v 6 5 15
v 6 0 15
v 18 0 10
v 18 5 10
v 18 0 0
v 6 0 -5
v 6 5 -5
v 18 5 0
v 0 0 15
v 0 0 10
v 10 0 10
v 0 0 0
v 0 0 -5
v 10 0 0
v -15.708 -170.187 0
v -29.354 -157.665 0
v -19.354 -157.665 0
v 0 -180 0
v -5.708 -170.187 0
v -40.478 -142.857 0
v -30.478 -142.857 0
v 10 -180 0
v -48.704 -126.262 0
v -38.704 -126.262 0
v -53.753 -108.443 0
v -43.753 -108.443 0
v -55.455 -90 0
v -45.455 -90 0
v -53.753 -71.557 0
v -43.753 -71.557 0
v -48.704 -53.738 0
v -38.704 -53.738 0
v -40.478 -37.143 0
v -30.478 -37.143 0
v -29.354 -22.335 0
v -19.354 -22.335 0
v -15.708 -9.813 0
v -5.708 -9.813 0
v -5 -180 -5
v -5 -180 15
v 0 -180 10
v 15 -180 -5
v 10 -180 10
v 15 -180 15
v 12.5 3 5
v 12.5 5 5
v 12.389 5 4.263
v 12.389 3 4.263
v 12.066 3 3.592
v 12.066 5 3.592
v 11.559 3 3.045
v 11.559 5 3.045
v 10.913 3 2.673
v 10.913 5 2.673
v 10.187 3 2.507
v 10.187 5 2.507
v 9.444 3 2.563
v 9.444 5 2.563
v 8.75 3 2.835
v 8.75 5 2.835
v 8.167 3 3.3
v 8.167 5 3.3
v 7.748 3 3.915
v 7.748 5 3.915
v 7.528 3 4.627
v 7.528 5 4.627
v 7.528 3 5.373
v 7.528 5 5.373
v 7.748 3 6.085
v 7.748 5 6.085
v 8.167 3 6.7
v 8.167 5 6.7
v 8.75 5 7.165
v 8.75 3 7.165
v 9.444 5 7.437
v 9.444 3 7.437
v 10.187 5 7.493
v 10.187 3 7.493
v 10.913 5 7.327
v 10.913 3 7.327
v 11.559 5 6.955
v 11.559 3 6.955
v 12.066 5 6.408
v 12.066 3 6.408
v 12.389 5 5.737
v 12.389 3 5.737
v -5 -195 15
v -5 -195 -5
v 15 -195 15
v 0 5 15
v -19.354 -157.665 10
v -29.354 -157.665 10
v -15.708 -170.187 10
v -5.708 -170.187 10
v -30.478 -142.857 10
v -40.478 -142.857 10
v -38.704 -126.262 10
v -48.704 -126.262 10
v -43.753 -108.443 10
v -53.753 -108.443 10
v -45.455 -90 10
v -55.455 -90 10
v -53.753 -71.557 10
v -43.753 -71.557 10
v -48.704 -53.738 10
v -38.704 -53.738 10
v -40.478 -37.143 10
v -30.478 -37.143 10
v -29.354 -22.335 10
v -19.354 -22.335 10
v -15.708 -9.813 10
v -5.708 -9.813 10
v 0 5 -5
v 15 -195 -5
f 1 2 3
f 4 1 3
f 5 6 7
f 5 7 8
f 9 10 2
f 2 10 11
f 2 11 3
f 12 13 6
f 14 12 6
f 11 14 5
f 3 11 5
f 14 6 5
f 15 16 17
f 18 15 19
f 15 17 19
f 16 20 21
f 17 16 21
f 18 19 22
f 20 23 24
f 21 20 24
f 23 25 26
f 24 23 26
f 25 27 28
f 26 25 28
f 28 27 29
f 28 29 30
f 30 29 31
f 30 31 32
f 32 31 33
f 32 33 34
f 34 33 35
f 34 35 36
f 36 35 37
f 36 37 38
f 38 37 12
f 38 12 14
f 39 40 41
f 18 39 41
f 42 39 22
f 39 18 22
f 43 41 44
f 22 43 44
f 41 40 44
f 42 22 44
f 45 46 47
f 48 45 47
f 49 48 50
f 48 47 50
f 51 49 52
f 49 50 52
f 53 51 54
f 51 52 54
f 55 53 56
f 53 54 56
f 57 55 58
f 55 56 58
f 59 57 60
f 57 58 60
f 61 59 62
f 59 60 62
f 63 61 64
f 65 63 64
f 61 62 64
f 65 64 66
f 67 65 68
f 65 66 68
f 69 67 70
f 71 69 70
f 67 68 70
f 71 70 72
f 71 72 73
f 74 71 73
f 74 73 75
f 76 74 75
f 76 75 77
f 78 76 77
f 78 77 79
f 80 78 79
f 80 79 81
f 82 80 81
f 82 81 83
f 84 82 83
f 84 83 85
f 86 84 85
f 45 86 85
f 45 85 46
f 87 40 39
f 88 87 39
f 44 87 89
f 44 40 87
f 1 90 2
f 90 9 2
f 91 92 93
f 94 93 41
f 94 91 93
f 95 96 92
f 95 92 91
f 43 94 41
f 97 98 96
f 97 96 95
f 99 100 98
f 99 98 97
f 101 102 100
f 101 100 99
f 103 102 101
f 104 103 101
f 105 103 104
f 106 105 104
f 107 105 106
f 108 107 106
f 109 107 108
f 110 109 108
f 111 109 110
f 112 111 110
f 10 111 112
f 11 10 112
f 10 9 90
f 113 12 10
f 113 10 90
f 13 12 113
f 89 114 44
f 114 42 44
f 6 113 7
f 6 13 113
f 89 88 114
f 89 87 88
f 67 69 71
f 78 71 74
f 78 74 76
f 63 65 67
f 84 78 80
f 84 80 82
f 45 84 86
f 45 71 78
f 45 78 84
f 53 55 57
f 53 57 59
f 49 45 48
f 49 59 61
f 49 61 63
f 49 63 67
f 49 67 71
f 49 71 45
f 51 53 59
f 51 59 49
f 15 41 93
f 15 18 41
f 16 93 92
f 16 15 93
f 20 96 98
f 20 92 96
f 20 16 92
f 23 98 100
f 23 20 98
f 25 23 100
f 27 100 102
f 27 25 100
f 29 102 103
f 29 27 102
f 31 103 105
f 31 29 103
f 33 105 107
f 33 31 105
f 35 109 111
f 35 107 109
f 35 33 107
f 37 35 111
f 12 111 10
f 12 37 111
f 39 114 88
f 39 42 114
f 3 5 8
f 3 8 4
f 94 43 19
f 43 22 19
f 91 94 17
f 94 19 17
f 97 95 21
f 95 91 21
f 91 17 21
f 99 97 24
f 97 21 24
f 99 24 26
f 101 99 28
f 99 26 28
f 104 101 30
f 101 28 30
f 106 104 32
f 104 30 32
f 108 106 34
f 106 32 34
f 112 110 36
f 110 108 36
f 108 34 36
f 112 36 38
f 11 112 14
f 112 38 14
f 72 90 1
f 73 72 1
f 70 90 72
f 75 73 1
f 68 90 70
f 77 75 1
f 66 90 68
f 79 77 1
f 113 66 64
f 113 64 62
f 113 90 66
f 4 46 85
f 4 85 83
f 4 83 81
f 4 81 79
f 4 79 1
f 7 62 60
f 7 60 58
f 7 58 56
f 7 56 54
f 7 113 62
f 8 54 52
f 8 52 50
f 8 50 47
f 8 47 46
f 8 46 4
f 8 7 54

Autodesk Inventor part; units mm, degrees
ref_plane "YZ Plane" through (0, 0, 0) normal (1, 0, 0) x (0, 1, 0)
ref_plane "XZ Plane" through (0, 0, 0) normal (0, 1, 0) x (-1, 0, 0)
ref_plane "XY Plane" through (0, 0, 0) normal (0, 0, 1) x (1, 0, 0)
sketch "Sketch1" plane through (0, 0, 0) normal (0, 0, 1) x (1, 0, 0)
  arc A0 (0, 0) -> (0, -180) centre (45.304, -90) ccw
  line L0 (-55.4554, -90) -> (-45.4554, -90) construction
  line L1 (0, -180) -> (0, -170) construction
  line L2 (0, 0) -> (0, -10) construction
  line L3 (0, -180) -> (10, -180) construction
  line L4 (0, 0) -> (10, 0) construction
  arc A1 (10, 0) -> (10, -180) centre (55.304, -90) ccw
  line L5 (0, 0) -> (10, 0)
  line L6 (10, -180) -> (0, -180)
  dimension "d0" = 180
  dimension "d1" = 10
  dimension "d2" = 10
  dimension "d3" = 10
  dimension "d4" = 10
  dimension "d5" = 10
extrude "Extrusion1" add sketch "Sketch1" along normal blind 10
sketch "Sketch2" plane through (0, 0, 0) normal (0, 1, 0) x (1, 0, 0)
  line L0 (-55.4554, -10) -> (0, -10) projected
  line L1 (0, -10) -> (0, -15)
  line L2 (0, -15) -> (0, 5)
  line L3 (0, 5) -> (6, 5)
  line L4 (0, -15) -> (6, -15)
  line L5 (6, -15) -> (18, -10)
  line L6 (6, 5) -> (18, 0)
  line L7 (18, 0) -> (18, -10)
  point P0 (0, 0)
  dimension "d8" = 5
  dimension "d9" = 20
  dimension "d10" = 6
  dimension "d11" = 13
extrude "Extrusion2" add sketch "Sketch2" along normal blind 5
sketch "Sketch3" plane through (0, -180, 0) normal (0, -1, 0) x (1, 0, 0)
  line L0 (0, -5) -> (0, 15) construction
  line L1 (0, 5) -> (-5, 5) construction
  line L2 (-5, 5) -> (0, 5) construction
  line L3 (0, 5) -> (-5, 5) construction
  line L4 (-5, 5) -> (-5, 15) construction
  line L5 (-5, 15) -> (15, 15) construction
  line L6 (15, 15) -> (15, -5) construction
  line L7 (15, -5) -> (-5, -5) construction
  line L8 (-5, -5) -> (-5, 5) construction
  line L9 (-5, 15) -> (15, 15)
  line L10 (15, -5) -> (-5, -5)
  line L11 (-5, 15) -> (-5, -5)
  line L12 (15, -5) -> (15, 15)
  point P0 (0, 0)
  dimension "d14" = 5
  dimension "d15" = 20
  dimension "d16" = 20
extrude "Extrusion3" add sketch "Sketch3" along normal blind 15
sketch "Sketch4" plane through (0, 5, 0) normal (0, 1, 0) x (1, 0, 0)
  line L0 (10, 0) -> (10, -10) projected
  circle A0 centre (10, -5) radius 2.5
  point P0 (0, 0)
  dimension "d19" = 5
extrude "Extrusion4" cut sketch "Sketch4" against normal blind 2
properties part number "kakidrone"
